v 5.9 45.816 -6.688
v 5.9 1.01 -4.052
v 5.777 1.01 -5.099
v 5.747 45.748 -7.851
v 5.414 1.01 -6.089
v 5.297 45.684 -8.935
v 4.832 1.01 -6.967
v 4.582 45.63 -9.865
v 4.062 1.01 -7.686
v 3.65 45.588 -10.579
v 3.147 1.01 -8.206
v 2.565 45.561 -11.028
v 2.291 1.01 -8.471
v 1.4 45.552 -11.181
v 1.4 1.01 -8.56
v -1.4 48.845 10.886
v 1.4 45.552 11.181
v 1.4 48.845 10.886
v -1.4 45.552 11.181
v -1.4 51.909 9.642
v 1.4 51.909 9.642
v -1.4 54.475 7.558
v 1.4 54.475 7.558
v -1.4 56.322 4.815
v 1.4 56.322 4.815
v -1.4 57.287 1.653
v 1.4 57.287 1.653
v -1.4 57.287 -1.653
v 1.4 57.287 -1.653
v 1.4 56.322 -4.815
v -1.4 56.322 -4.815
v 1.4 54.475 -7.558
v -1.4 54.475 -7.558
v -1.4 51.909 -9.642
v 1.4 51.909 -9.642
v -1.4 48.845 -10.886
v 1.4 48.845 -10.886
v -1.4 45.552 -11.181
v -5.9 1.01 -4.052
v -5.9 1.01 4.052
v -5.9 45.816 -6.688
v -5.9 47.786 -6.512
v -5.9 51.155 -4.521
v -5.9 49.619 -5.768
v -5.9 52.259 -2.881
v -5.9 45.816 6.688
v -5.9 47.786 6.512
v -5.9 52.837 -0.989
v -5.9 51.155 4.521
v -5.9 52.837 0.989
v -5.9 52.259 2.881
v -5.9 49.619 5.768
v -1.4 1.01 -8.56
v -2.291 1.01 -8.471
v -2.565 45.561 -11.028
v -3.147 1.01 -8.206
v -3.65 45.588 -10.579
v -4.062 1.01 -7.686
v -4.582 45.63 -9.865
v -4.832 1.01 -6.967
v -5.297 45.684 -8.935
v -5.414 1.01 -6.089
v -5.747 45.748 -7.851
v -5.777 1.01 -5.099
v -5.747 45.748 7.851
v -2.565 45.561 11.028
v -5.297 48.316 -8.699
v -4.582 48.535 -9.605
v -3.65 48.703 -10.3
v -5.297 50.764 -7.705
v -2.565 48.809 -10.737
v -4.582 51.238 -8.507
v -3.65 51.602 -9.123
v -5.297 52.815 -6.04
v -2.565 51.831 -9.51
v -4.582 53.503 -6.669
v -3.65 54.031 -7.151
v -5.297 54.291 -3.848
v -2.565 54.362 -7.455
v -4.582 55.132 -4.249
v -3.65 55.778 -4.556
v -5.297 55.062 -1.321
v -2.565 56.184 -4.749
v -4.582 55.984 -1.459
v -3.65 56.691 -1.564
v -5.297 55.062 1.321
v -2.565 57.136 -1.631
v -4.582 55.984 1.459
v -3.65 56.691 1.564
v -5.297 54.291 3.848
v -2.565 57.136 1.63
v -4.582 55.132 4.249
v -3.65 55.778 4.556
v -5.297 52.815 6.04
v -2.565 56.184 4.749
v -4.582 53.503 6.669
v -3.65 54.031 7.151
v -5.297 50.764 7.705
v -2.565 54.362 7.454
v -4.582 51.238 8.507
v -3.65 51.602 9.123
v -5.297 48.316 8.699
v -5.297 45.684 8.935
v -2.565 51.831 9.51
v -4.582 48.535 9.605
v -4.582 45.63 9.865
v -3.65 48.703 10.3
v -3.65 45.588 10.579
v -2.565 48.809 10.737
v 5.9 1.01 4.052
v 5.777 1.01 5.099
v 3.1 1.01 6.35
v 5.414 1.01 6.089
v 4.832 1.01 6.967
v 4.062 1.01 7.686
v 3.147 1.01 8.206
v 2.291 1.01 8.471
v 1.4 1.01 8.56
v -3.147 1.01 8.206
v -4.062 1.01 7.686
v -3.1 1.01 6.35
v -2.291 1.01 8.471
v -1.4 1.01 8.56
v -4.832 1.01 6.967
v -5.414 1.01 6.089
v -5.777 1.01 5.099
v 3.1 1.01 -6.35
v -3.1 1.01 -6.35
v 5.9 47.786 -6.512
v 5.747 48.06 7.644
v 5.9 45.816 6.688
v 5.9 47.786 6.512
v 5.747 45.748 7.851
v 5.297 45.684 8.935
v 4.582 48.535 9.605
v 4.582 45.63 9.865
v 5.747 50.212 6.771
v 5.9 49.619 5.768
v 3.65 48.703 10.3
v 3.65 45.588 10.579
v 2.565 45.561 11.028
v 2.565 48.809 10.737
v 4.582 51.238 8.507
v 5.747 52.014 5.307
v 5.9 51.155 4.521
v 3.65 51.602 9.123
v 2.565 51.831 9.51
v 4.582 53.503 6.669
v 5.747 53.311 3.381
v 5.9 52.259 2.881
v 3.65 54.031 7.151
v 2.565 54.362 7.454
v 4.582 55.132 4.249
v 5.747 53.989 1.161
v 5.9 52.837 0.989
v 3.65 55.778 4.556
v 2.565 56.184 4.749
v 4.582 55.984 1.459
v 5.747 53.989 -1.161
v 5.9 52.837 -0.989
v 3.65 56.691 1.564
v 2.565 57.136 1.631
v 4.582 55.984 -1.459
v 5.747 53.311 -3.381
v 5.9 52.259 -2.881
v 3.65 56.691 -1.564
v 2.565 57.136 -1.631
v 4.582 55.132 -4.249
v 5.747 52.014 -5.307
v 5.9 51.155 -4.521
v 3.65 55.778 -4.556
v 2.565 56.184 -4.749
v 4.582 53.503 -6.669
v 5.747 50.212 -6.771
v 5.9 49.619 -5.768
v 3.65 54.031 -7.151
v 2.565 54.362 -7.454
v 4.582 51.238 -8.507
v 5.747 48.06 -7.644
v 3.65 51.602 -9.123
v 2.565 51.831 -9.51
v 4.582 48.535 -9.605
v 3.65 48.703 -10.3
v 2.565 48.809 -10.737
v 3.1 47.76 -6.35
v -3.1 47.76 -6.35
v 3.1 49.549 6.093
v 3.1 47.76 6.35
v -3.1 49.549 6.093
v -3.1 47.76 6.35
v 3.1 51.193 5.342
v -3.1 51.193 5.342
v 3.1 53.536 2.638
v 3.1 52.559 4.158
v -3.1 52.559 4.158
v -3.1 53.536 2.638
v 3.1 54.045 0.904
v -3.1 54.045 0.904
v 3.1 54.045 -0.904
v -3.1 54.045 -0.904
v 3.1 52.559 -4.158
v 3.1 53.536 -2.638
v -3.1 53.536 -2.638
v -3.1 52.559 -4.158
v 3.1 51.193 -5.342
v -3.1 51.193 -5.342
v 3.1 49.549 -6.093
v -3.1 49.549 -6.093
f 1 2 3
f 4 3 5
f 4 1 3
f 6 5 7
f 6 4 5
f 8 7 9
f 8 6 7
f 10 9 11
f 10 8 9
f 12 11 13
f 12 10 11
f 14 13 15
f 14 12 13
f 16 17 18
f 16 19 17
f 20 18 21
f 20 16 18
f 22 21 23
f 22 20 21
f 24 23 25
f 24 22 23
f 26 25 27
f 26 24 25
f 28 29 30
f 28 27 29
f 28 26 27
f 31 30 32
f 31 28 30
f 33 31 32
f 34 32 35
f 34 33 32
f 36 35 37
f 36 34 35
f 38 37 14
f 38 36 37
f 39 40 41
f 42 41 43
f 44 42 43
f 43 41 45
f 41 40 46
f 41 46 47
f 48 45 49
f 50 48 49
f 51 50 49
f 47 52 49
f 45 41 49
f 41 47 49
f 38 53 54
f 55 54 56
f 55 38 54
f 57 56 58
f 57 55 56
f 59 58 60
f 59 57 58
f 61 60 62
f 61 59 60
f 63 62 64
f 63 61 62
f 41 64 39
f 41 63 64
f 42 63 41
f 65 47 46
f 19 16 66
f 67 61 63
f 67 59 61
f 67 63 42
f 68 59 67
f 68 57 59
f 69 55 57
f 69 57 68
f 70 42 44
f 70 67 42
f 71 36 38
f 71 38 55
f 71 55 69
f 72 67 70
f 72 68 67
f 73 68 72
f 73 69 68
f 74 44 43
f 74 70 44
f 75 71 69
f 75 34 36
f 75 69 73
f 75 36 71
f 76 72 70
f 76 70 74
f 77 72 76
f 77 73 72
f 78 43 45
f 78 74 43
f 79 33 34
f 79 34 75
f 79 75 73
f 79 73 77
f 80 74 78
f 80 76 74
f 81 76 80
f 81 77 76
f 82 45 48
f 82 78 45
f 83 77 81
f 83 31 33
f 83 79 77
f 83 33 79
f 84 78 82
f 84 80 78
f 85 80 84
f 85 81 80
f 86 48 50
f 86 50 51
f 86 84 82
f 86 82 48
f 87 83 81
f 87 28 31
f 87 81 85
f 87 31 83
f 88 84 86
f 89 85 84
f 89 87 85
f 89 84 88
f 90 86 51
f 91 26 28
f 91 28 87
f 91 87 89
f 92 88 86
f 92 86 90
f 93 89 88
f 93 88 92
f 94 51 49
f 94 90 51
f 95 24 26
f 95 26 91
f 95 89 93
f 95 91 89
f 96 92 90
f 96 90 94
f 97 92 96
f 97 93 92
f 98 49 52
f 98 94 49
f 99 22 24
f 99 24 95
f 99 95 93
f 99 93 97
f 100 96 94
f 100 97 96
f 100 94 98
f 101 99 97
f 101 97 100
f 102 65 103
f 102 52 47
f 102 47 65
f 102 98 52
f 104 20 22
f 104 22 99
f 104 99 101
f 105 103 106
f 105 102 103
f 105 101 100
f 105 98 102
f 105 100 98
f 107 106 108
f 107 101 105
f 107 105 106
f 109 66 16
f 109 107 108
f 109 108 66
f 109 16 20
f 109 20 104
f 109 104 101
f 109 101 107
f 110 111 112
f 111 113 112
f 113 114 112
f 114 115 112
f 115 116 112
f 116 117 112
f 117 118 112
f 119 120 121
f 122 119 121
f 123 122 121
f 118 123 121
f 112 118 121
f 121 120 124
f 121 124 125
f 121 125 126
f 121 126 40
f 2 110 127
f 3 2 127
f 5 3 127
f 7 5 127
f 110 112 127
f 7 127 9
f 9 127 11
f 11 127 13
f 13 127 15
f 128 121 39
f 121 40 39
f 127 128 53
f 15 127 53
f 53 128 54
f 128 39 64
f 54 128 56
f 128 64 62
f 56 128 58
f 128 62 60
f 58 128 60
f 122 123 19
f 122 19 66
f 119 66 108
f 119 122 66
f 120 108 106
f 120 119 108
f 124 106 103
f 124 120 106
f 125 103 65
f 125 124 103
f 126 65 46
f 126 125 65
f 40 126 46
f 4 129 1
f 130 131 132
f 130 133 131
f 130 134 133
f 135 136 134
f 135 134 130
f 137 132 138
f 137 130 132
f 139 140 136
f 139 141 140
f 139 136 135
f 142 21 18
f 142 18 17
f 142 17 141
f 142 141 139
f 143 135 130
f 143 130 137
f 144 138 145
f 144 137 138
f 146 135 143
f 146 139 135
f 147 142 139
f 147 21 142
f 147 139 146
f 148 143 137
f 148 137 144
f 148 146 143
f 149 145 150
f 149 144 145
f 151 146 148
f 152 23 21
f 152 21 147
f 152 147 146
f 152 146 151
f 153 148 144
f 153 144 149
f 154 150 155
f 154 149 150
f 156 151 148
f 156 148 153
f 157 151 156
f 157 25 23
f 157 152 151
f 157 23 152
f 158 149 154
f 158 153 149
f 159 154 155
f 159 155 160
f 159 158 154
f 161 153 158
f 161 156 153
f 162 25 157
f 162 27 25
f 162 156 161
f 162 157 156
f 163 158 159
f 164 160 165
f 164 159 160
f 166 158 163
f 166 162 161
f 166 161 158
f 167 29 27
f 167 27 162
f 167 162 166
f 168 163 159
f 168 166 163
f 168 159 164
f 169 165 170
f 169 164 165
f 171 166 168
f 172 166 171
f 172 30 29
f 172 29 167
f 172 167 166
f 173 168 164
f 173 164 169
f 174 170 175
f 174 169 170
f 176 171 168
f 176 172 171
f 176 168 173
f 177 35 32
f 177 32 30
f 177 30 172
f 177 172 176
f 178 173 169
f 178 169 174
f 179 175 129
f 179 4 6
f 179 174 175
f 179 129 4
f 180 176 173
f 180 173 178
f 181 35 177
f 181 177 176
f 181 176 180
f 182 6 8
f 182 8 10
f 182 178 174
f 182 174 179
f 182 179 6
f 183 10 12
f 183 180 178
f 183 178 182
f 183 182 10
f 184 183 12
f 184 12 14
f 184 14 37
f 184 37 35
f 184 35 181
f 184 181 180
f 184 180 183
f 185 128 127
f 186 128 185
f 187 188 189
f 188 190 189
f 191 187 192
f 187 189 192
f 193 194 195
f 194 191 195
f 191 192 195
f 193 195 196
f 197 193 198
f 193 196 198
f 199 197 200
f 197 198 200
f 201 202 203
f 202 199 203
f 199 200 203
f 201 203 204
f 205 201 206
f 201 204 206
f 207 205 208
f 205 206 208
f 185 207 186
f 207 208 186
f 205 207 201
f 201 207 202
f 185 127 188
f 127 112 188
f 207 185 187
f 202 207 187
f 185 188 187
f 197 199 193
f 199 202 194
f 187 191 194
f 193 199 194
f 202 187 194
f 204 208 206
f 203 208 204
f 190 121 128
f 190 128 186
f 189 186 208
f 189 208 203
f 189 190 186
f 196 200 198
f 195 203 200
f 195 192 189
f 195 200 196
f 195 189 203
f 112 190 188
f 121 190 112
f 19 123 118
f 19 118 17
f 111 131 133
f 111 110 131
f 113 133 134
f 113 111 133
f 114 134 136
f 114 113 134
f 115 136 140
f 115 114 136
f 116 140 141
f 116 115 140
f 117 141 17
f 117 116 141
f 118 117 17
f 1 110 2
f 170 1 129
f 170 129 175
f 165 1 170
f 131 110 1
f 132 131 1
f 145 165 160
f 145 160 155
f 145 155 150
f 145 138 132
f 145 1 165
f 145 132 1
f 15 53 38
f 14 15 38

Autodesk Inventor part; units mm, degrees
ref_plane "YZ Plane" through (0, 0, 0) normal (1, 0, 0) x (0, 1, 0)
ref_plane "XZ Plane" through (0, 0, 0) normal (0, 1, 0) x (-1, 0, 0)
ref_plane "XY Plane" through (0, 0, 0) normal (0, 0, 1) x (1, 0, 0)
sketch "Sketch1" plane through (0, 0, 0) normal (1, 0, 0) x (0, 1, 0)
  line L0 (47.76, 6.35) -> (1.01, 6.35)
  arc A0 (47.76, -6.35) -> (47.76, 6.35) centre (47.76, 0) ccw
  line L1 (1.01, -6.35) -> (47.76, -6.35)
  arc A1 (45.5521, -11.1807) -> (45.5521, 11.1807) centre (46.21, 0) ccw
  line L2 (1.01, 8.56) -> (45.5521, 11.1807)
  line L3 (1.01, -8.56) -> (45.5521, -11.1807)
  line L4 (1.01, 8.56) -> (1.01, -8.56)
  point P0 (0.24, 0)
  point P1 (1.01, 0)
  point P2 (0, 0)
  dimension "d0" = 17.12
  dimension "d2" = 11.2
  dimension "d3" = 2.21
  dimension "d4" = 46.75
  dimension "d5" = 45.2
  dimension "d7" = 8.5
  dimension "d9" = 0.24
extrude "Extrusion1" add sketch "Sketch1" along normal mid plane 11.8
fillet "Fillet1" radius 4.5 6 edges at (5.9, 57.41, 0) (5.9, 23.281, 9.8703) (5.9, 23.281, -9.8703) (-5.9, 57.41, 0) (-5.9, 23.281, 9.8703) (-5.9, 23.281, -9.8703)
extrude "Extrusion2" cut sketch "Sketch1" along normal mid plane 6.2 contours A0 L1 L4 L0
properties part number "Grip_1"
